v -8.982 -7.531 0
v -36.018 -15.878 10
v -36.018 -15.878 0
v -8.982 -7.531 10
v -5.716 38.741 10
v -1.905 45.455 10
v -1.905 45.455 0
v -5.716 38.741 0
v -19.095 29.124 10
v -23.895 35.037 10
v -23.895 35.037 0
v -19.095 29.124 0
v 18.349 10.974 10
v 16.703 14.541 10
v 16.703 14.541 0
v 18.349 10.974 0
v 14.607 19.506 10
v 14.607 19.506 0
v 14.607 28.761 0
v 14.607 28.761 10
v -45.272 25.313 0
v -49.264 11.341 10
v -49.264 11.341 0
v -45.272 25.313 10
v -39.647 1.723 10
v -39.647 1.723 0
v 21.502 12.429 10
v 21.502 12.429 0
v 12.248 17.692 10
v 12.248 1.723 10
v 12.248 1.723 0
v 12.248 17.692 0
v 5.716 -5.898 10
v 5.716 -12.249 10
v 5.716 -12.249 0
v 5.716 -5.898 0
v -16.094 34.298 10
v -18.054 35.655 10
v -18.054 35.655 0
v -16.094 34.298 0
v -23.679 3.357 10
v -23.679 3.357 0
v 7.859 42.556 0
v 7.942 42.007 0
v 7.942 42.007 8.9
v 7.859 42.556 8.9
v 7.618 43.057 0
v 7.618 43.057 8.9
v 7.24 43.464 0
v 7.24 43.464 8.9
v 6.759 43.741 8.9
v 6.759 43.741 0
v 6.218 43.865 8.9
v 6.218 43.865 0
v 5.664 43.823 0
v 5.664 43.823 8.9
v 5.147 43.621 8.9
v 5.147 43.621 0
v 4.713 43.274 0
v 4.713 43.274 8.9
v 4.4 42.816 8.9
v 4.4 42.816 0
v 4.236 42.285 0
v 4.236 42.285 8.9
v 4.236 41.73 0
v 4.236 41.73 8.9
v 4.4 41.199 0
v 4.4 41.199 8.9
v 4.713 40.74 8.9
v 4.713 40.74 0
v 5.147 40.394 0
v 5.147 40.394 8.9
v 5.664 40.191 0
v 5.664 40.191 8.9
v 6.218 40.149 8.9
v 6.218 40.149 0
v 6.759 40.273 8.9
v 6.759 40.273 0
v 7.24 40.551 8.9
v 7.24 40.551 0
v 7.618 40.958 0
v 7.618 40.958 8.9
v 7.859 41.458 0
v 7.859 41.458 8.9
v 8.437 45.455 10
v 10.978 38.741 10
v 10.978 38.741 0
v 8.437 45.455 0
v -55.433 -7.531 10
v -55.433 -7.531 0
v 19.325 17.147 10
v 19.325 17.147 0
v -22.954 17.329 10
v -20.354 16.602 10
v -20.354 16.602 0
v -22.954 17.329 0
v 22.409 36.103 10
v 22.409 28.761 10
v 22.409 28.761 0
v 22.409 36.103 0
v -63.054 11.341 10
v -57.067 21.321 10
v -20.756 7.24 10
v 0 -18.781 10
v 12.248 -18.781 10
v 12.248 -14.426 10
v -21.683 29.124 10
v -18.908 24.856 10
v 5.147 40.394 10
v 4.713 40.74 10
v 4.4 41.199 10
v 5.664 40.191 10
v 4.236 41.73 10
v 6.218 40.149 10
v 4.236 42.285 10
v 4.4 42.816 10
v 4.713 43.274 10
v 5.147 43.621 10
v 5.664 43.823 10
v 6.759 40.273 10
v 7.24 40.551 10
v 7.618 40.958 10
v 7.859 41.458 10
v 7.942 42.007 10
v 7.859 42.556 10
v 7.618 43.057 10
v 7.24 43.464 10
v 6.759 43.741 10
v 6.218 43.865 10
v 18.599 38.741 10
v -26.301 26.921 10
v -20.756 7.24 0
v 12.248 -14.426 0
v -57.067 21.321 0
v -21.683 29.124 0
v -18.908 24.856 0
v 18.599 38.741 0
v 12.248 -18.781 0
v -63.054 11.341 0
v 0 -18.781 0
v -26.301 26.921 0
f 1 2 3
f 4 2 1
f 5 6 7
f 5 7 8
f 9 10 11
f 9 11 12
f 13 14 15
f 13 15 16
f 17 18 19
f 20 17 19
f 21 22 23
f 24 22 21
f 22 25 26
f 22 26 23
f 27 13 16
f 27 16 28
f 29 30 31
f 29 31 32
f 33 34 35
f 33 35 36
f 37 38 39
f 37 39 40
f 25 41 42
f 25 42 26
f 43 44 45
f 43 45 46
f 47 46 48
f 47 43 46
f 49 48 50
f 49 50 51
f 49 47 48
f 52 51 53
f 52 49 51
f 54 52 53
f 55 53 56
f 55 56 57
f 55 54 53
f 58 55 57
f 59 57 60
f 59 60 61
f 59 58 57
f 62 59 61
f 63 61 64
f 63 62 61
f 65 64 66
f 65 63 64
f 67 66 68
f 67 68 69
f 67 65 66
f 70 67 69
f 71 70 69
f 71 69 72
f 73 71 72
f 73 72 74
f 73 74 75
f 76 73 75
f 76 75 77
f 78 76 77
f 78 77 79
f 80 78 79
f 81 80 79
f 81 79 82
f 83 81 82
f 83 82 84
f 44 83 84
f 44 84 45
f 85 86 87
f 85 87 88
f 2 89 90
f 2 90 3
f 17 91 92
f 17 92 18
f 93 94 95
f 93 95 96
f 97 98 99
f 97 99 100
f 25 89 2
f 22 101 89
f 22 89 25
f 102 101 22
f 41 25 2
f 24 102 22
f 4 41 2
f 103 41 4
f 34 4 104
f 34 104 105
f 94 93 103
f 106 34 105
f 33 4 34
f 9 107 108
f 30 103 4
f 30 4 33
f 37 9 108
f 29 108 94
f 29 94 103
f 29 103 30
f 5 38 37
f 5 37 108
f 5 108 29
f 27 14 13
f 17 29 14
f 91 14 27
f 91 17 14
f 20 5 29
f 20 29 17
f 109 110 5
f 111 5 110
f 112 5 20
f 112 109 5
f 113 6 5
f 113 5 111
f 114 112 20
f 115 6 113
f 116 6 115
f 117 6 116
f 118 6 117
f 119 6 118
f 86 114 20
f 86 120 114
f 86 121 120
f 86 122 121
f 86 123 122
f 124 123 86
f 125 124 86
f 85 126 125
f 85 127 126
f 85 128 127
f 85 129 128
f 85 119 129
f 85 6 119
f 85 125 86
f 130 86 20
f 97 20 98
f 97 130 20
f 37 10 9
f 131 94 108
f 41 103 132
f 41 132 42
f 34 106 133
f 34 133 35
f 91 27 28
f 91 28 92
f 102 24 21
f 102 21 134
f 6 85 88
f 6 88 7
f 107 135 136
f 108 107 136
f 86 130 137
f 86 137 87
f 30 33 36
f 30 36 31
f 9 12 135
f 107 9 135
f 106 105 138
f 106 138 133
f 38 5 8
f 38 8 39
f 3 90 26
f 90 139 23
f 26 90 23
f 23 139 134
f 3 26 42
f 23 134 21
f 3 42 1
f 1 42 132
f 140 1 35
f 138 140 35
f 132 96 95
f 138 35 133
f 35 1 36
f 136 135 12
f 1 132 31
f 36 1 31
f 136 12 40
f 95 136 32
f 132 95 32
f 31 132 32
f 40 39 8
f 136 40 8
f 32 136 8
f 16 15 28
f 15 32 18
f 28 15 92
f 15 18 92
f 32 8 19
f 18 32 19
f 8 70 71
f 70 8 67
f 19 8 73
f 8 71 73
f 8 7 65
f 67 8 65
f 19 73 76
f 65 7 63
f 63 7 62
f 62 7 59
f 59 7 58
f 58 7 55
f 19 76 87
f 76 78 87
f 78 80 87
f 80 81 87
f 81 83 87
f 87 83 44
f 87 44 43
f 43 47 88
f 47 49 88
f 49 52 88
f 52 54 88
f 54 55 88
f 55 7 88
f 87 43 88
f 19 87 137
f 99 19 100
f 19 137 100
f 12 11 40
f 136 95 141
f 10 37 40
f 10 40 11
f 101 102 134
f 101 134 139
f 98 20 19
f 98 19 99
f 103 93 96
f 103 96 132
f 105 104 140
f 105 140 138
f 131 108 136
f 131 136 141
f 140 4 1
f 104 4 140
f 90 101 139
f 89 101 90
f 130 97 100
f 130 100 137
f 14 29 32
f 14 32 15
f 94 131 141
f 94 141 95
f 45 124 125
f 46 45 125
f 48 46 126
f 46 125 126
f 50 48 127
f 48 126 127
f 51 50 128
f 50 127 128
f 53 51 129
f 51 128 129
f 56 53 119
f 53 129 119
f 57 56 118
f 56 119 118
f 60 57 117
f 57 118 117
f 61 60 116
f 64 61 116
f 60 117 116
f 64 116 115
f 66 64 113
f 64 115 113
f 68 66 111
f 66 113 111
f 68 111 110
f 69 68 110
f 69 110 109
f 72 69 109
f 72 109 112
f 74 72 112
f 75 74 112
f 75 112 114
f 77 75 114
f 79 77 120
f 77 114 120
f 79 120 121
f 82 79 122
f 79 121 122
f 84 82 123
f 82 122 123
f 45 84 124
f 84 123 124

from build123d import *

# Parameters (mm, degrees)
F0_R     = 1.8629584398
F1_DEPTH = 9
F2_DEPTH = 10
F3_DEPTH = 1.1


with BuildPart() as f1:
    # F0 (on Top) → F1 (new body)
    with BuildSketch(Plane.XY):
        Polygon((18.5987912118, 38.7409813702), (10.9778223559, 38.7409813702), (8.437499404, 45.4549640417), (-1.9052419811, 45.4549640417), (-5.7157264091, 38.7409813702), (-8.618952008, 29.1236611083), (-11.5221776068, 19.5063408464), (-13.6186698187, 16.7213371643), (-14.8627730185, 15.0686565711), (-20.7560974635, 7.2398985219), (-23.6794371158, 3.3565014601), (-39.6471805871, 1.7233715625), (-49.2641143501, 11.3406926394), (-45.2721789479, 25.3130253404), (-57.0665337145, 21.3209297508), (-63.0544349551, 11.3406926394), (-55.4334707558, -7.5310315005), (-36.0181480646, -15.8781390637), (-8.9818555862, -7.5310315005), (-8.9818555862, -1.3614293421), (-4.0826620534, 6.2598437071), (5.7157254778, 6.2598437071), (5.7157254778, -5.8979014866), (12.2479852289, 1.7233715625), (12.2479852289, 17.6917538047), (16.7028524828, 14.5414304721), (18.3491399307, 10.9743302194), (21.5020161122, 12.4294450507), (19.3245969713, 17.1473771334), (14.606856741, 19.5063408464), (14.606856741, 28.7607442588), (22.4092733115, 28.7607442588), (22.4092733115, 36.1032277718), align=None)
        with Locations((6.0786283575, 42.0072451234)):
            Circle(F0_R, mode=Mode.SUBTRACT)
    extrude(amount=F1_DEPTH)

    # F0 (on Top) → F2 (join)
    with BuildSketch(Plane.XY):
        Polygon((18.5987912118, 38.7409813702), (10.9778223559, 38.7409813702), (8.437499404, 45.4549640417), (-1.9052419811, 45.4549640417), (-5.7157264091, 38.7409813702), (-8.618952008, 29.1236611083), (-11.5221776068, 19.5063408464), (-13.6186698187, 16.7213371643), (-14.8627730185, 15.0686565711), (-20.7560974635, 7.2398985219), (-23.6794371158, 3.3565014601), (-39.6471805871, 1.7233715625), (-49.2641143501, 11.3406926394), (-45.2721789479, 25.3130253404), (-57.0665337145, 21.3209297508), (-63.0544349551, 11.3406926394), (-55.4334707558, -7.5310315005), (-36.0181480646, -15.8781390637), (-8.9818555862, -7.5310315005), (-8.9818555862, -1.3614293421), (-4.0826620534, 6.2598437071), (5.7157254778, 6.2598437071), (5.7157254778, -5.8979014866), (12.2479852289, 1.7233715625), (12.2479852289, 17.6917538047), (16.7028524828, 14.5414304721), (18.3491399307, 10.9743302194), (21.5020161122, 12.4294450507), (19.3245969713, 17.1473771334), (14.606856741, 19.5063408464), (14.606856741, 28.7607442588), (22.4092733115, 28.7607442588), (22.4092733115, 36.1032277718), align=None)
        with Locations((6.0786283575, 42.0072451234)):
            Circle(F0_R, mode=Mode.SUBTRACT)
        Polygon((-8.618952008, 29.1236611083), (-5.7157264091, 38.7409813702), (-18.0544368923, 35.6552451849), (-16.0939348651, 34.2981147375), align=None)
        Polygon((-19.0954450518, 29.1236611083), (-8.618952008, 29.1236611083), (-16.0939348651, 34.2981147375), align=None)
        Polygon((-11.5221776068, 19.5063408464), (-8.618952008, 29.1236611083), (-19.0954450518, 29.1236611083), (-21.6834675521, 29.1236611083), (-18.9082012561, 24.8557609363), (-13.6186698187, 16.7213371643), align=None)
        Polygon((-19.0954450518, 29.1236611083), (-16.0939348651, 34.2981147375), (-23.8949824125, 35.0367799401), align=None)
        Polygon((-14.8627730185, 15.0686565711), (-13.6186698187, 16.7213371643), (-18.9082012561, 24.8557609363), (-20.3540053018, 16.6024911018), align=None)
        Polygon((-20.7560974635, 7.2398985219), (-14.8627730185, 15.0686565711), (-20.3540053018, 16.6024911018), (-22.9536294937, 17.3286292702), align=None)
        Polygon((-20.3540053018, 16.6024911018), (-18.9082012561, 24.8557609363), (-26.3009262924, 26.9207285705), align=None)
        Polygon((5.7157254778, -12.2489631176), (5.7157254778, -5.8979014866), (5.7157254778, 6.2598437071), (-4.0826620534, 6.2598437071), (-8.9818555862, -1.3614293421), (-8.9818555862, -7.5310315005), (0, -18.7814813107), (12.2479852289, -18.7814813107), (12.2479852289, -14.4264688715), align=None)
    extrude(amount=F2_DEPTH)

    # F3 (add): a face of the model
    f3_faces = [f1.faces().sort_by_distance(p)[0] for p in [
        (-14.7622843494, 10.8873438604, 10),
    ]]
    extrude(f3_faces, amount=-F3_DEPTH)


solid = f1.part
